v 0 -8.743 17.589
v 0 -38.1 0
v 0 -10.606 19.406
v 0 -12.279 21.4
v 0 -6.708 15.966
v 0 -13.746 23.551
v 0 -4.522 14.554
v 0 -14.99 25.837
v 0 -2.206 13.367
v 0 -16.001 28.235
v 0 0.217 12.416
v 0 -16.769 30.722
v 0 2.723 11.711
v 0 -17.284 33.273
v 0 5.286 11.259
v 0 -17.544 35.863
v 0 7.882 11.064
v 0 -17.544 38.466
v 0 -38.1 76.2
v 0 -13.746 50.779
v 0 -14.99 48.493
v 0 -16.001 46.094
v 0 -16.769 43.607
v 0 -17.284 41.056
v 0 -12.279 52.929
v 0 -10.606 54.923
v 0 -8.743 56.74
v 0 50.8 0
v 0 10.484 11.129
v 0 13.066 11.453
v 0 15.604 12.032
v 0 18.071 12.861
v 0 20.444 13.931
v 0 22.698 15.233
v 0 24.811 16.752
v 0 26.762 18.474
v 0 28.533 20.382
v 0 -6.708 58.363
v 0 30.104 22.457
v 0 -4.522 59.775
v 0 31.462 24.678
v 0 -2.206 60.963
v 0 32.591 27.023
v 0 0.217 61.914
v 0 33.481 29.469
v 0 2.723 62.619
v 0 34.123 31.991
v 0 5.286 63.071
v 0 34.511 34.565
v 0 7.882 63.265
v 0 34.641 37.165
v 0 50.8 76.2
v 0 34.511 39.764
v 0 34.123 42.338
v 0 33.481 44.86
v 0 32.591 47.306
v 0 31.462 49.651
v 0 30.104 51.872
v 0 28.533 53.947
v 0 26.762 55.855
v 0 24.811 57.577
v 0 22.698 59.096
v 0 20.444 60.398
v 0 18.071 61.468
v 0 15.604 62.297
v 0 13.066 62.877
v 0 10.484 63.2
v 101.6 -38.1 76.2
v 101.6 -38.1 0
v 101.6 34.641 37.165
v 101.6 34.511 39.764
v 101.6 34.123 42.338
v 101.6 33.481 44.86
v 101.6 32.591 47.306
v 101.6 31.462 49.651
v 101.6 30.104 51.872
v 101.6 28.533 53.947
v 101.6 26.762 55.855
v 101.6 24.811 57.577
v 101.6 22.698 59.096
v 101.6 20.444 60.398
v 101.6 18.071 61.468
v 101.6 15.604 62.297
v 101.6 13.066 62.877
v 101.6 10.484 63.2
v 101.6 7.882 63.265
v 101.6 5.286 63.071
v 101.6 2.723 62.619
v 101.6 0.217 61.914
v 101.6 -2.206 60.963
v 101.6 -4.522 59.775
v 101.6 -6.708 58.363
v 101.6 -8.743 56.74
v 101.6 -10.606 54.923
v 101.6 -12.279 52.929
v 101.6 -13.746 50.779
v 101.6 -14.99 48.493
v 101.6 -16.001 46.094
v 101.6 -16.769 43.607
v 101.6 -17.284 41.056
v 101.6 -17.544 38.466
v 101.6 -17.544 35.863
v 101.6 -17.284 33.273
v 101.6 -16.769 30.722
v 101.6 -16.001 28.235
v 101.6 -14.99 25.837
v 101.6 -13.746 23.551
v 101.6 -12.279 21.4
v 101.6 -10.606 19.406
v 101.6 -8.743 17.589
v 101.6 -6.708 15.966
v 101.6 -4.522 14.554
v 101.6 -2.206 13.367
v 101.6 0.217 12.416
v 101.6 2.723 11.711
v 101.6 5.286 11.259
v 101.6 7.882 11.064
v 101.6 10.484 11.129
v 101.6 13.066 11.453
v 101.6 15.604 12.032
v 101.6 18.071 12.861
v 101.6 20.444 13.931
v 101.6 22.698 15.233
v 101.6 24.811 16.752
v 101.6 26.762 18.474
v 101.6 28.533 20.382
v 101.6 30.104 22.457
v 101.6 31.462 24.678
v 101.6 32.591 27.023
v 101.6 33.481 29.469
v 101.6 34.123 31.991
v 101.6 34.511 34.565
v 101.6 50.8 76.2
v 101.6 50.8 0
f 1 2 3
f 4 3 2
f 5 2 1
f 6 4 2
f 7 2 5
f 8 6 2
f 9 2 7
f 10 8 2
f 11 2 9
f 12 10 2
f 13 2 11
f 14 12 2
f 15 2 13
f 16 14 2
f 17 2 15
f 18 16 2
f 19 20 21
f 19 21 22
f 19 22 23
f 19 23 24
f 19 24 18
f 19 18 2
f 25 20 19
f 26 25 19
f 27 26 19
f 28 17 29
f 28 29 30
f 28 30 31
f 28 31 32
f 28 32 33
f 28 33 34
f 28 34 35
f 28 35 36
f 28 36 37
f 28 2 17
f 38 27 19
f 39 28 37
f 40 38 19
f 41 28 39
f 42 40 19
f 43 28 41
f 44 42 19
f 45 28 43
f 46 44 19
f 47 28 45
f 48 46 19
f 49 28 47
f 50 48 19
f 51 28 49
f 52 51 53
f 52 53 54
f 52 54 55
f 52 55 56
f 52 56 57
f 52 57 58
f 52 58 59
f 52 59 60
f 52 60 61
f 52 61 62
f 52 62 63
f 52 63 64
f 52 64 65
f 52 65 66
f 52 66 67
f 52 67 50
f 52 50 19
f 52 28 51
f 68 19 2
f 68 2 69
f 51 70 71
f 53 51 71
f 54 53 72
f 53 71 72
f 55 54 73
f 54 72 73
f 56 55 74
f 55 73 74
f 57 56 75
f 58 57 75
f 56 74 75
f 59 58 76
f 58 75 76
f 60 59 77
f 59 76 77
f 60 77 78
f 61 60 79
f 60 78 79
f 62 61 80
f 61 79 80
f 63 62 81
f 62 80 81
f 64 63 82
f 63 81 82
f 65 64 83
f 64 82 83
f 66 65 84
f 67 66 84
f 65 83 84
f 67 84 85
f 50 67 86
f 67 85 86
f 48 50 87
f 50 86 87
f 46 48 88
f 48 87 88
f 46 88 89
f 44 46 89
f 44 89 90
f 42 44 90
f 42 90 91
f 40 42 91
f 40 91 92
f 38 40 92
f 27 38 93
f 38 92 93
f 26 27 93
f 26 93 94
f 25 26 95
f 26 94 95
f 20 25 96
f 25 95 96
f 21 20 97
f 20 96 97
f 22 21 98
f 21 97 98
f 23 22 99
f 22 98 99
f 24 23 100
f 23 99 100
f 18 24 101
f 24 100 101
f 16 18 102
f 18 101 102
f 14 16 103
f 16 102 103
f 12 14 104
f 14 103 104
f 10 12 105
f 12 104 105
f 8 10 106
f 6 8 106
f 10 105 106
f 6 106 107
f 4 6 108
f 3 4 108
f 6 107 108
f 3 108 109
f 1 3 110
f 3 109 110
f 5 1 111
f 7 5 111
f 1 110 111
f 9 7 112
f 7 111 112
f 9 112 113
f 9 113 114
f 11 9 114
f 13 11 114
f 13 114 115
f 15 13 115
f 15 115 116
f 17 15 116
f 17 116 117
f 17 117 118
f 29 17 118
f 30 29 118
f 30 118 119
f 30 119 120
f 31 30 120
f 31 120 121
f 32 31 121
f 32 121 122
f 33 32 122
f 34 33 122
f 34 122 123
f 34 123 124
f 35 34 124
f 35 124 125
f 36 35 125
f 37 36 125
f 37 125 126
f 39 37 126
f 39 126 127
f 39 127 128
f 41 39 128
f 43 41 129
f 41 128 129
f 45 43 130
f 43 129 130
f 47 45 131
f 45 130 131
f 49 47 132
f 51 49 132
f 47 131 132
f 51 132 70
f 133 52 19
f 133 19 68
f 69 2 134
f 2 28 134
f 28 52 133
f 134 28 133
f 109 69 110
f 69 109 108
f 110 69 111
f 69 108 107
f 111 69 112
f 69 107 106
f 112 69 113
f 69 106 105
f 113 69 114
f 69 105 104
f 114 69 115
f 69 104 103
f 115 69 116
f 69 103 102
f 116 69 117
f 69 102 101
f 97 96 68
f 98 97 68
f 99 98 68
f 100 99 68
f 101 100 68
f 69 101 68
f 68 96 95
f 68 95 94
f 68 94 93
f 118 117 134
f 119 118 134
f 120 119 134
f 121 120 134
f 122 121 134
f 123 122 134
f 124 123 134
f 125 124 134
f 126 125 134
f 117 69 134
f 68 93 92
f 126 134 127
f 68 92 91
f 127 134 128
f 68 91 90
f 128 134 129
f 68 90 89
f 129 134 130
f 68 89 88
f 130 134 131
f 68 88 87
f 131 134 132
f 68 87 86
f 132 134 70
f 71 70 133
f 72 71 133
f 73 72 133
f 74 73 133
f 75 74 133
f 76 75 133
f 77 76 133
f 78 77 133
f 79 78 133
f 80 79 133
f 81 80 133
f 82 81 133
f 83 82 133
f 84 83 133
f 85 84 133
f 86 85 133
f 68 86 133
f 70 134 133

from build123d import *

# Parameters (mm, degrees)
F0_W      = 101.6
F0_H      = 76.2
F1_DEPTH  = 50.8
F1_FACE_W = 101.6
F1_FACE_H = 76.2
F2_DEPTH  = 38.1
F3_R      = 26.108539
F4_DEPTH  = 101.6


with BuildPart() as f1:
    # F0 (on Front) → F1 (new body)
    with BuildSketch(Plane.XZ):
        with Locations((50.8, 38.1)):
            Rectangle(F0_W, F0_H)
    extrude(amount=-F1_DEPTH)

    # F1_face (on face) → F2 (join)
    with BuildSketch(Plane(origin=(50.8, 0, 38.1), x_dir=(1, 0, 0), z_dir=(0, -1, 0))):
        Rectangle(F1_FACE_W, F1_FACE_H)
    extrude(amount=F2_DEPTH)

    # F3 (on face) → F4 (cut)
    with BuildSketch(Plane.YZ.offset(101.6)):
        with Locations((8.532524, 37.164632)):
            Circle(F3_R)
    extrude(amount=-F4_DEPTH, mode=Mode.SUBTRACT)


solid = f1.part
